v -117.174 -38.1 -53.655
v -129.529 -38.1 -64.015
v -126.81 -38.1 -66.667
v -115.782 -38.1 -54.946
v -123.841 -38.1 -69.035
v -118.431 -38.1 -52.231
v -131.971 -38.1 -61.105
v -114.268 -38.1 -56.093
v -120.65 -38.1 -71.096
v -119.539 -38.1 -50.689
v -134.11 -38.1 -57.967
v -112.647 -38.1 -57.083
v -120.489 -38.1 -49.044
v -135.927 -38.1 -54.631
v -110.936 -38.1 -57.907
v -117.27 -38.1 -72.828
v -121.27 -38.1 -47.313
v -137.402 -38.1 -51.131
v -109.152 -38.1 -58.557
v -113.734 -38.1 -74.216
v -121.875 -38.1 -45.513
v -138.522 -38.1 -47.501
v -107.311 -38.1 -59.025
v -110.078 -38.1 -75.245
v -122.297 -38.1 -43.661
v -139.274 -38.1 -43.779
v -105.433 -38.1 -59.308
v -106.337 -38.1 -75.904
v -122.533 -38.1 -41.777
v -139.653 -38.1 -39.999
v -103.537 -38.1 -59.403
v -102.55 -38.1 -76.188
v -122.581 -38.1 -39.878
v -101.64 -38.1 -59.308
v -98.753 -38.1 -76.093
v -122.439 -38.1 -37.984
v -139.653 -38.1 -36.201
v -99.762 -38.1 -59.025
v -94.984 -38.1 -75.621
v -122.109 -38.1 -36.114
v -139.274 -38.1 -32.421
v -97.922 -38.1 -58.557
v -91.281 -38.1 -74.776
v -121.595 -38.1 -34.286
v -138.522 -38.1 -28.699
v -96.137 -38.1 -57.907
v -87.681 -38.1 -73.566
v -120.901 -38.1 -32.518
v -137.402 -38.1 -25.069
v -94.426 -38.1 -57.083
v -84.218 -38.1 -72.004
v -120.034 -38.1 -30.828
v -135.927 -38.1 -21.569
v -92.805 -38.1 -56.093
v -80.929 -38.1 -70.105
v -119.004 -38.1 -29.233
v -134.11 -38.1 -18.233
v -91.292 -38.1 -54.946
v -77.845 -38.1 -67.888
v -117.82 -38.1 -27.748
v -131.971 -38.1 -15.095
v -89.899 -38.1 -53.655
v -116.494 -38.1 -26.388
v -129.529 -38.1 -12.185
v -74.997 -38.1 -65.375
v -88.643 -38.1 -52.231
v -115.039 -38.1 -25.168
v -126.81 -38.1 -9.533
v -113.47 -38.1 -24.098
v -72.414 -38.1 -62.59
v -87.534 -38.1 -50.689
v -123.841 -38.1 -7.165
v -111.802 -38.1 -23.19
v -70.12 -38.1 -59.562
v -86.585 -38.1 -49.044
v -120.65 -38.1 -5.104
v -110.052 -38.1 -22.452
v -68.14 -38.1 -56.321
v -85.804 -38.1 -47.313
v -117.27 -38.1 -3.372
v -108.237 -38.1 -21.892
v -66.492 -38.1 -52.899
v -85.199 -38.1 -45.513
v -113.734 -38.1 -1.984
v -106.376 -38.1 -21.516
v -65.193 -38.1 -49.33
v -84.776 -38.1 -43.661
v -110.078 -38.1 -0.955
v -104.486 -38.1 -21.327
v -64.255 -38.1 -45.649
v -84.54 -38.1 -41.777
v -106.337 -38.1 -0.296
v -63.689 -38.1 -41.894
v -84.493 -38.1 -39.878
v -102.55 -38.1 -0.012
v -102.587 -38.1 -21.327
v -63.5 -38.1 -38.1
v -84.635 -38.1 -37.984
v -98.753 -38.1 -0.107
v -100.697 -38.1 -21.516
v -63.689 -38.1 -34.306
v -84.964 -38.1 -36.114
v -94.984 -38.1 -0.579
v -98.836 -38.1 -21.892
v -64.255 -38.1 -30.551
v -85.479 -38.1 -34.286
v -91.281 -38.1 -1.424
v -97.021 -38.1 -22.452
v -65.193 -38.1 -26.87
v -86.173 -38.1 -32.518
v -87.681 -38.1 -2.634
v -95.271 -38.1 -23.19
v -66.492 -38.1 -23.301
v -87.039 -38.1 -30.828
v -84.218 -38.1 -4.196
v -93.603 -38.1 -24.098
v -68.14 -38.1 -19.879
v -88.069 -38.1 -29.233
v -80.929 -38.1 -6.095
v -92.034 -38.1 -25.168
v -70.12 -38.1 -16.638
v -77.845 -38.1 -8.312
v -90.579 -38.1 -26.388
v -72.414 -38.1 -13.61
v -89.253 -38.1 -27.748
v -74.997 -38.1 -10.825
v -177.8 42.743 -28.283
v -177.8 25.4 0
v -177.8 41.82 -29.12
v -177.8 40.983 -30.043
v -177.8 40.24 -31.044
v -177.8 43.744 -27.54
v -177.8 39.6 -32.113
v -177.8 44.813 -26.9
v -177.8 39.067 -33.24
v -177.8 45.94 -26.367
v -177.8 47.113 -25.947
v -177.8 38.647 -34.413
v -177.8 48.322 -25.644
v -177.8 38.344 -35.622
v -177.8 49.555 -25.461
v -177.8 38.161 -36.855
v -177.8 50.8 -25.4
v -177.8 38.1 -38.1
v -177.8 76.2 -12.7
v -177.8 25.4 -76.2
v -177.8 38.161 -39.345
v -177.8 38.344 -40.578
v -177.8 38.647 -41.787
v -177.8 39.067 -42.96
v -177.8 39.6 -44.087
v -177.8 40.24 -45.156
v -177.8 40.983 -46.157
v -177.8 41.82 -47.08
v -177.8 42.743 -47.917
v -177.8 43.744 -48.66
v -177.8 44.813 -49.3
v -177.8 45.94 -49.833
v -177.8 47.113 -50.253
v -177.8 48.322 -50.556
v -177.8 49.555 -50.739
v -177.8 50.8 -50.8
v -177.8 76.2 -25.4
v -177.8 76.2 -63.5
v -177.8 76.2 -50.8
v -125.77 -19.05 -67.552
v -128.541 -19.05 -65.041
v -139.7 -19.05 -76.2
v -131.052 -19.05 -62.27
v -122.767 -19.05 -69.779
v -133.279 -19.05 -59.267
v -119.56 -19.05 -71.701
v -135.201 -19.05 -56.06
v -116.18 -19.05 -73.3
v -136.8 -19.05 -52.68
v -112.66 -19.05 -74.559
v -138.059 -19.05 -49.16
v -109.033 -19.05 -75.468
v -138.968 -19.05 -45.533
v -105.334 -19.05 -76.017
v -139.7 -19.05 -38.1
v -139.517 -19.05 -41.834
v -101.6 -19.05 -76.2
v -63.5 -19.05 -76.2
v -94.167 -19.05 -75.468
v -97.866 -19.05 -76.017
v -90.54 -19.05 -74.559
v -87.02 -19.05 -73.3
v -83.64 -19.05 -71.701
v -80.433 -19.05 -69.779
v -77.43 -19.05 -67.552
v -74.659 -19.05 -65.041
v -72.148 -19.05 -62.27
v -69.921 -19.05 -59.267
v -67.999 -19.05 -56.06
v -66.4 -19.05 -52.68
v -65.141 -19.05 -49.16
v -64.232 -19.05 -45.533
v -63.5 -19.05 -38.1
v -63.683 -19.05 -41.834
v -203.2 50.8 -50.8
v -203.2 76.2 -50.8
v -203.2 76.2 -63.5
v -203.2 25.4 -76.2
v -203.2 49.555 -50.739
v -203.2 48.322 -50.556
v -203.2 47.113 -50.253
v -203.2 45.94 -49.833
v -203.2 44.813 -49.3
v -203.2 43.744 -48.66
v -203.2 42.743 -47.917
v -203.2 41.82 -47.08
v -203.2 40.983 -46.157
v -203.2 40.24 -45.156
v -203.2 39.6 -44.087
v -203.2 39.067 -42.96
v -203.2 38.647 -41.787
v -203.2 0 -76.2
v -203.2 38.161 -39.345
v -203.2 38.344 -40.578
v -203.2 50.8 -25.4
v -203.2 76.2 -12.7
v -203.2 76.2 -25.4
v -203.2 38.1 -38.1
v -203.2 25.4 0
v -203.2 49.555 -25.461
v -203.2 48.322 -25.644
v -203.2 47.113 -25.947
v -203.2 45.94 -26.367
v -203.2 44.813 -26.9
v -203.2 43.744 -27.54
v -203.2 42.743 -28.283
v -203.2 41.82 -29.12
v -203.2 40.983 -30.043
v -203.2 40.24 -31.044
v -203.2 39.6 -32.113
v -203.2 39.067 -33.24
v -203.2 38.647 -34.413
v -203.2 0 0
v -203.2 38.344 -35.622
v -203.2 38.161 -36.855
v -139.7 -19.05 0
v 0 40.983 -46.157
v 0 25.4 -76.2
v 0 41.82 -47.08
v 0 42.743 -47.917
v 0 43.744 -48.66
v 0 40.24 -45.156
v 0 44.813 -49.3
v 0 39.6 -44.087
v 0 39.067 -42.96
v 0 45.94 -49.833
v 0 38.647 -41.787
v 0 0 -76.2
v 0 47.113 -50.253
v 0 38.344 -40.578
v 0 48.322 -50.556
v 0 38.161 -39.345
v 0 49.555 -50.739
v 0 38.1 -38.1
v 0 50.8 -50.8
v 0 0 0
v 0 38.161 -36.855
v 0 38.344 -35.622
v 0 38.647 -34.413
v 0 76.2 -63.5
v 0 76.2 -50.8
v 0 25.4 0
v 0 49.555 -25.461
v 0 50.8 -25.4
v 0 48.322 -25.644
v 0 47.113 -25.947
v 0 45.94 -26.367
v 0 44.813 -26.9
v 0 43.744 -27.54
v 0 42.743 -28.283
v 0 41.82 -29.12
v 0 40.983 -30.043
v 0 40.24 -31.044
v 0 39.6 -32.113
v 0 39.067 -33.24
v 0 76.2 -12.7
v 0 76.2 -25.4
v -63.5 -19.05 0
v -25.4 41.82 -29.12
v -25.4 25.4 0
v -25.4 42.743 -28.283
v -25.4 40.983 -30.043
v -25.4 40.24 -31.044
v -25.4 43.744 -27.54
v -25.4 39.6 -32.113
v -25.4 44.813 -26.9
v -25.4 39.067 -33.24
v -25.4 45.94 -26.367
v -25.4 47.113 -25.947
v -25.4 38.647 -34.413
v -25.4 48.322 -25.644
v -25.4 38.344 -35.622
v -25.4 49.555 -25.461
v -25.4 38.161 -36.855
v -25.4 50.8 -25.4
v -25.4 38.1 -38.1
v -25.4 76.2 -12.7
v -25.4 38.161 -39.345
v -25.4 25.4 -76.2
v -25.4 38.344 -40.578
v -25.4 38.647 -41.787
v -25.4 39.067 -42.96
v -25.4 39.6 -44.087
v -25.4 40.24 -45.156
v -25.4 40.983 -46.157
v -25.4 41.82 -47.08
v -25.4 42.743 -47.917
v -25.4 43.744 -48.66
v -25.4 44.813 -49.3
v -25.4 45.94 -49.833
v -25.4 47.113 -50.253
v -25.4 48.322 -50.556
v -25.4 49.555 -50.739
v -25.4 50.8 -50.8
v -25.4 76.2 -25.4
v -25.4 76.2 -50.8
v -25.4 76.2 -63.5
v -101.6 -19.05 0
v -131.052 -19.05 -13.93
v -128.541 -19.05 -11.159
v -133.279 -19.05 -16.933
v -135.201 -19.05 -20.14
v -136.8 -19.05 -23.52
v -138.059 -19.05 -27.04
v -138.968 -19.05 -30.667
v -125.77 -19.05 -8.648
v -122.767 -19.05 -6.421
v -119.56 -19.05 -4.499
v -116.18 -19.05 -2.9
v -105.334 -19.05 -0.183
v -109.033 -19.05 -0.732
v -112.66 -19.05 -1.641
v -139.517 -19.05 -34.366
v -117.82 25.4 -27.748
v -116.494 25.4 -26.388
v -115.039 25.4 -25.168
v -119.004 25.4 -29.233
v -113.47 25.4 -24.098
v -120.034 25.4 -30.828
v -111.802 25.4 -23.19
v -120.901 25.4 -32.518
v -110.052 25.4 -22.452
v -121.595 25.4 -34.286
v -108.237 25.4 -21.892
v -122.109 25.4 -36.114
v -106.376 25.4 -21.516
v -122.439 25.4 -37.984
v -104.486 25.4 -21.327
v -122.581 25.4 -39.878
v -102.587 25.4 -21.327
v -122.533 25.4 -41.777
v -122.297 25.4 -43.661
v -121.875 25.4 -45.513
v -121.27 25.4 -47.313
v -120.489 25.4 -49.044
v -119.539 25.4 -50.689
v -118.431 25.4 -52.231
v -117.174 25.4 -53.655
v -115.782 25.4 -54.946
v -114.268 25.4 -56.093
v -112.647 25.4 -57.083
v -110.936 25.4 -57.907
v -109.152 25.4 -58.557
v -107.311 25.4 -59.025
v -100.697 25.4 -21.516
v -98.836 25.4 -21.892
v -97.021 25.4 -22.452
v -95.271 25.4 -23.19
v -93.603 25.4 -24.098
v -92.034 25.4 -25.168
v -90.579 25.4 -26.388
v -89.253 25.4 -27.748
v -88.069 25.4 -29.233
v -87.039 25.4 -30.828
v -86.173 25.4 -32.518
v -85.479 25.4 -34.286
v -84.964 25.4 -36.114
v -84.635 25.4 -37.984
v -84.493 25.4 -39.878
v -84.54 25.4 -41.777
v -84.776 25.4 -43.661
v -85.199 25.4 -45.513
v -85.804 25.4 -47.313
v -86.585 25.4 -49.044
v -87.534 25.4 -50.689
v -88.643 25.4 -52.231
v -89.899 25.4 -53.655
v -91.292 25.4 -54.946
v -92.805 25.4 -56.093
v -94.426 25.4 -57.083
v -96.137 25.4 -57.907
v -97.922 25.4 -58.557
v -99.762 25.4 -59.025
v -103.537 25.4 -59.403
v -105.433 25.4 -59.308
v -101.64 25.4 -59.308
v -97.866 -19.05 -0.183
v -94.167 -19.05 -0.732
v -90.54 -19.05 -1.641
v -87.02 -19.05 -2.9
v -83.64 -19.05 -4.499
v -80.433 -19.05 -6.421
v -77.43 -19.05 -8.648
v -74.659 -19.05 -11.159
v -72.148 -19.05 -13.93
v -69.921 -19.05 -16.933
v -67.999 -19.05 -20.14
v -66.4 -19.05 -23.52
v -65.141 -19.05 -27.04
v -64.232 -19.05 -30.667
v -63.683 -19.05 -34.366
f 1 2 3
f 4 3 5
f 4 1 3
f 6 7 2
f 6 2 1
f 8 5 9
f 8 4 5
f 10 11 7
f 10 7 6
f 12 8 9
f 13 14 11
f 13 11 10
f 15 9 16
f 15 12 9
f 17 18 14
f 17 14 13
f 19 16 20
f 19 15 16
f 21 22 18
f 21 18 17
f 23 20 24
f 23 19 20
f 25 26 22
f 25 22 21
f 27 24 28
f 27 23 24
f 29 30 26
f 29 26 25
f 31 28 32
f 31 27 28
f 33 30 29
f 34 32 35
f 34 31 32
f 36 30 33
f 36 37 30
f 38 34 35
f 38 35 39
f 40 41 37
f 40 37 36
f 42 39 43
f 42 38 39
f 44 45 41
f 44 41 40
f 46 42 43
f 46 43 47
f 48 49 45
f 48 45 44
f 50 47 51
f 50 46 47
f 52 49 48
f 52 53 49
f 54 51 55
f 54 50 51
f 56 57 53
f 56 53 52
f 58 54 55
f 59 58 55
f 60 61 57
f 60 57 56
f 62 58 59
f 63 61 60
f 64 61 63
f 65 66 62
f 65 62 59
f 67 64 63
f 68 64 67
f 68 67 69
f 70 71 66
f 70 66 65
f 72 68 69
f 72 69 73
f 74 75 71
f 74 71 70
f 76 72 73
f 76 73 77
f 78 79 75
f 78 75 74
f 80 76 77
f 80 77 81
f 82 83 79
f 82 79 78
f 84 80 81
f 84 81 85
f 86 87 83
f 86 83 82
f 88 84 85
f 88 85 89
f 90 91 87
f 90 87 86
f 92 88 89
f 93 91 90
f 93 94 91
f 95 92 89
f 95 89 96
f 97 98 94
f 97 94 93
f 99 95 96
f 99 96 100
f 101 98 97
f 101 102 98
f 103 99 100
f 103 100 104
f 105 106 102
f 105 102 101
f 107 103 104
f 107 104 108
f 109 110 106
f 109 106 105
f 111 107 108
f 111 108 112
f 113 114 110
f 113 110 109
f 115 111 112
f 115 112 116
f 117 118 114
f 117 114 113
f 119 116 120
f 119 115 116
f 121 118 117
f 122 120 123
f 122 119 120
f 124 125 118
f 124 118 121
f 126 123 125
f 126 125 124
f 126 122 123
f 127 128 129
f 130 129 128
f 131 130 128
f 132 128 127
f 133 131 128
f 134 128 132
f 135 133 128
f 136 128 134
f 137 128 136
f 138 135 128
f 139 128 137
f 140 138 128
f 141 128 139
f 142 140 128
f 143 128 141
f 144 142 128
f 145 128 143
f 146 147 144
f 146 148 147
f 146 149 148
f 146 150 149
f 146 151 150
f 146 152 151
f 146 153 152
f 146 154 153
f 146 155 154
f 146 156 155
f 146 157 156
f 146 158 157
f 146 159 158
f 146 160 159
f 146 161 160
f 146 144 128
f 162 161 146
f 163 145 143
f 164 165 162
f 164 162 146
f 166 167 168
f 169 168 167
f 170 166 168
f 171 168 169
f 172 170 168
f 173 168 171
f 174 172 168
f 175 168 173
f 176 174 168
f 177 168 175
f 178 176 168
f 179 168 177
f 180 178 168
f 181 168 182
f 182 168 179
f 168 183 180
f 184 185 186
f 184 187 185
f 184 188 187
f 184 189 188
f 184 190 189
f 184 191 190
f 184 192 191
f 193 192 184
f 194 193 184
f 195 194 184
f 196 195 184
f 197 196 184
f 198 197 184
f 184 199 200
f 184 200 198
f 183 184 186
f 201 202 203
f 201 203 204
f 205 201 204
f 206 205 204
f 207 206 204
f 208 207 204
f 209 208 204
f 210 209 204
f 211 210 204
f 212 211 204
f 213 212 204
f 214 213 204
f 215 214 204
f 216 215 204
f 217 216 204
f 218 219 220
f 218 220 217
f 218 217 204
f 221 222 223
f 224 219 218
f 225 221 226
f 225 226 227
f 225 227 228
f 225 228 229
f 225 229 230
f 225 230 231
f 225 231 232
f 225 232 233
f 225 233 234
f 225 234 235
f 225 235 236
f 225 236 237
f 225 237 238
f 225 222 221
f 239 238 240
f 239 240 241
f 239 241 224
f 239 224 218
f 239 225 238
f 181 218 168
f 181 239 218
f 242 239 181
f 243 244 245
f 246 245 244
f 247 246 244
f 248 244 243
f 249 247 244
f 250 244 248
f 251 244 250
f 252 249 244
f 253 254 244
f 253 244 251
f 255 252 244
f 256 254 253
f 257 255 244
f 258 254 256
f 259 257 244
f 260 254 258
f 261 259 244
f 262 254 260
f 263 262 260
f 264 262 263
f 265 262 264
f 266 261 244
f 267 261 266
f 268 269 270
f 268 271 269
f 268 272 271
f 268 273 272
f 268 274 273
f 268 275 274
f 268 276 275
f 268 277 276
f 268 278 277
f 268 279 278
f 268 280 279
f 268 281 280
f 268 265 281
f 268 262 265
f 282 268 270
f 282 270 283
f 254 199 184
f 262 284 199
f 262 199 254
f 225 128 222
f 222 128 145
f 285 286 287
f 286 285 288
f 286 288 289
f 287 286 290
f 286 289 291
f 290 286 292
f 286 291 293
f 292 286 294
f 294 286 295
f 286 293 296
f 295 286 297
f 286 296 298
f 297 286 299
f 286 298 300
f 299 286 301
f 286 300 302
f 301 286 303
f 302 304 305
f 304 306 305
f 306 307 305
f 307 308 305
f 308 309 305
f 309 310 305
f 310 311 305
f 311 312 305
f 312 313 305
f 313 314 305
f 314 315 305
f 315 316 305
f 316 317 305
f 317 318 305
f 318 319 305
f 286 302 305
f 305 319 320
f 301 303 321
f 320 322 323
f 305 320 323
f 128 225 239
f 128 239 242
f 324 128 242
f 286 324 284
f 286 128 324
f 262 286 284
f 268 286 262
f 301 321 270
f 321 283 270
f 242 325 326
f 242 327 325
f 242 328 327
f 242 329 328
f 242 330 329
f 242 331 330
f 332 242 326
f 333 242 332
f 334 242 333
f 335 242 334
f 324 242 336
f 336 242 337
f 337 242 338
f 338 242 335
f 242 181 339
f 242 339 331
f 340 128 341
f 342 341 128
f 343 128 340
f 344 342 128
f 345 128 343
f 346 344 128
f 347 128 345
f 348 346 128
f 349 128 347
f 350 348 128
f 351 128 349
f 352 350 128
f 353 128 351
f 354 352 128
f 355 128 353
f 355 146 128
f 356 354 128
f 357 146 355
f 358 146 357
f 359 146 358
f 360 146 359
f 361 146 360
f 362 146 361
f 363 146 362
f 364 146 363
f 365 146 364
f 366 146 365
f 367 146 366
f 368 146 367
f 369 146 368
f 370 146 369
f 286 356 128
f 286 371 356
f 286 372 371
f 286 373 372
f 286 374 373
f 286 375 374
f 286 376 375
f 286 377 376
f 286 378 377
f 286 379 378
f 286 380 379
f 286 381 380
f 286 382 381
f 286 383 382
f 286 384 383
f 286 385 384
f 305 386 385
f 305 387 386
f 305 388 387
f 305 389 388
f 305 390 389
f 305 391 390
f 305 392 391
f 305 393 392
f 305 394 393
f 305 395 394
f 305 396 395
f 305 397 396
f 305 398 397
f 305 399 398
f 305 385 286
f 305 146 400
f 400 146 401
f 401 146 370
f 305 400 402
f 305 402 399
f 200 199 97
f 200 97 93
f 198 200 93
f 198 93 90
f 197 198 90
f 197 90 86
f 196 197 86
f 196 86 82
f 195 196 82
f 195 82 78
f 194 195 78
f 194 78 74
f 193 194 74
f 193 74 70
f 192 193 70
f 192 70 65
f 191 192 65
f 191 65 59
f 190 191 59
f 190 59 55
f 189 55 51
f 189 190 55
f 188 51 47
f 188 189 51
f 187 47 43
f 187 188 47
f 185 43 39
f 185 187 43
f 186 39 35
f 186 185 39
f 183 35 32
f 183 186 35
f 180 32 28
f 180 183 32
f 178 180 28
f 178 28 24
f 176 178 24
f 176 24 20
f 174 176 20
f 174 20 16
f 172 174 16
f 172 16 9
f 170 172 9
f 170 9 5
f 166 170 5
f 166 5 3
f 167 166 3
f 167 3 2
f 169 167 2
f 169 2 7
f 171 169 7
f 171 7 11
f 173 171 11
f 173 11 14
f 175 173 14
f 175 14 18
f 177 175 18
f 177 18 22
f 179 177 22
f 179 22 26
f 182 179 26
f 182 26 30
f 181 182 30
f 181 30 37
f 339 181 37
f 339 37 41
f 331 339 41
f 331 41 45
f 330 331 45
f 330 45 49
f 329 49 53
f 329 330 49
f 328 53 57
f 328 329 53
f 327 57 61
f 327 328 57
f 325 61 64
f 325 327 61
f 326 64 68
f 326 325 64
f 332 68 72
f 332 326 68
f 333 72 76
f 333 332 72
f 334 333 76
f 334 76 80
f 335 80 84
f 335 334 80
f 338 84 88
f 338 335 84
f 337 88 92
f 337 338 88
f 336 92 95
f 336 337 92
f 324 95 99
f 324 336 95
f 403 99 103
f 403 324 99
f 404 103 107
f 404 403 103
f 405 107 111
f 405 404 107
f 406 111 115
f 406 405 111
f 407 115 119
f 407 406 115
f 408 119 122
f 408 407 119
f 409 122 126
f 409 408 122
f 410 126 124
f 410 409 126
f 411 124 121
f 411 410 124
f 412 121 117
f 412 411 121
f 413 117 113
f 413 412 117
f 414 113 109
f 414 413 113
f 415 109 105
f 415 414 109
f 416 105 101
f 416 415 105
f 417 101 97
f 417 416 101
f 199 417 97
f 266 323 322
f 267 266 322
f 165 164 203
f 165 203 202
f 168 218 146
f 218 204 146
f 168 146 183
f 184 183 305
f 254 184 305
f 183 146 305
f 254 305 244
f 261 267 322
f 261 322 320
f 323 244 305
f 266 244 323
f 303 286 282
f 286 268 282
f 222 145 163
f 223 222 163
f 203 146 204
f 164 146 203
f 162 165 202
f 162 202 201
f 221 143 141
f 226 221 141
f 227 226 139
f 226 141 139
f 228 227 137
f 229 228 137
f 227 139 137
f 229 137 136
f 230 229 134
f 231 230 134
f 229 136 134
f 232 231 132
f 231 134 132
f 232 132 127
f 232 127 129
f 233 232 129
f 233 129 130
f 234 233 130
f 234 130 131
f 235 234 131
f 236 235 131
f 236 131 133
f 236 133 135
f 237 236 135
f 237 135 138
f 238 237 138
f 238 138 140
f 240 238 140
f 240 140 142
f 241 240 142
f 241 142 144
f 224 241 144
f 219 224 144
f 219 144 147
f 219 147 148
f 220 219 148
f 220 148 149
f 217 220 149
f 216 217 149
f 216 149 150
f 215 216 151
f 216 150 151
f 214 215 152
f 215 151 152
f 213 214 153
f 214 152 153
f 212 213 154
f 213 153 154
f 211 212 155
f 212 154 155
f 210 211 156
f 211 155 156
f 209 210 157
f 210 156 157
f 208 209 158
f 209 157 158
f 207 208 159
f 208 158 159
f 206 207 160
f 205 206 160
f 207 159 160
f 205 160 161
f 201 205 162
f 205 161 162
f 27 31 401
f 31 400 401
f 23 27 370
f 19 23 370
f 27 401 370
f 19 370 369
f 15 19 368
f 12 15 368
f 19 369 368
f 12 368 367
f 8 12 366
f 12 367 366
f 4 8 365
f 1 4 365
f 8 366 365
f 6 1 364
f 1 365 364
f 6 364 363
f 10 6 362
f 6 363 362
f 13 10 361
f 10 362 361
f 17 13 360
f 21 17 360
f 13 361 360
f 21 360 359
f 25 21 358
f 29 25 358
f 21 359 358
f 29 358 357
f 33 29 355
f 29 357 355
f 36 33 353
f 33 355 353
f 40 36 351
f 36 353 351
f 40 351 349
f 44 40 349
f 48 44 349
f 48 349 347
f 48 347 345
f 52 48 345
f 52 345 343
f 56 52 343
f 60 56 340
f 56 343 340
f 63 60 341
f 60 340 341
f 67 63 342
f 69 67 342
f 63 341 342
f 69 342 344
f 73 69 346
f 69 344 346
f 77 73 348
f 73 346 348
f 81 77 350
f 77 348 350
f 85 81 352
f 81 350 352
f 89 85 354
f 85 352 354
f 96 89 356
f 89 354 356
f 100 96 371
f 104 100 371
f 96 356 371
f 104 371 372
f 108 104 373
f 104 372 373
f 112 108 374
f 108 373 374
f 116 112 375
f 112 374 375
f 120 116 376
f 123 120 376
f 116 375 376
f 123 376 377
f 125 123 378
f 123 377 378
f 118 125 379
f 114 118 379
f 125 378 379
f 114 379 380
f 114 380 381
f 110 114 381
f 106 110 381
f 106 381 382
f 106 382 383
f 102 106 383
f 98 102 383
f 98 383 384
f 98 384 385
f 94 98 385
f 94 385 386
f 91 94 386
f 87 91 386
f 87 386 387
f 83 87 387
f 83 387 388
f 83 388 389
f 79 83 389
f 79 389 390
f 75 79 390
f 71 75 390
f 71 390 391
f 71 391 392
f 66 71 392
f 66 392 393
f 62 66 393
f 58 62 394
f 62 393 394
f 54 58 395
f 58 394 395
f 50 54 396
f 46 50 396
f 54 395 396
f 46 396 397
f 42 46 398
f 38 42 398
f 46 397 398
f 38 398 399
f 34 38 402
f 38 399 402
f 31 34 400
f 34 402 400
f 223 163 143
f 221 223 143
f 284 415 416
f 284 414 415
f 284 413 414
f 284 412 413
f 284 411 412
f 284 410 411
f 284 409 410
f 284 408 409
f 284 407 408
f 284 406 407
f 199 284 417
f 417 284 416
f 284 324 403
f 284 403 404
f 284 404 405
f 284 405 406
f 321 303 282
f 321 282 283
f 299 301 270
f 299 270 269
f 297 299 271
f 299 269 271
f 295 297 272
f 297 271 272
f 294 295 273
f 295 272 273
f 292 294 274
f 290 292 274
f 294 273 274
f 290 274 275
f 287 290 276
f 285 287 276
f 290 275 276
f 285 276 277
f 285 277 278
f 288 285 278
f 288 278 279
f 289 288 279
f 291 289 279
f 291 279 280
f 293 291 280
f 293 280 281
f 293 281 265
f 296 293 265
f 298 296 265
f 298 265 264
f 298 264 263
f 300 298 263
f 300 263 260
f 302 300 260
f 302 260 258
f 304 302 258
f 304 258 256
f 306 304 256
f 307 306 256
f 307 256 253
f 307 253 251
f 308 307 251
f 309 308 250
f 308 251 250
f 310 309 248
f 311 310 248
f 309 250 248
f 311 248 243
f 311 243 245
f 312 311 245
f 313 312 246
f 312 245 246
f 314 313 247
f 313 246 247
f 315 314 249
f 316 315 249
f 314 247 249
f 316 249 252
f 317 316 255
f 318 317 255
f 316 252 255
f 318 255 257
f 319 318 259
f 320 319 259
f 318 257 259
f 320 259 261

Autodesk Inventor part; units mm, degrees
ref_plane "YZ Plane" through (0, 0, 0) normal (1, 0, 0) x (0, 1, 0)
ref_plane "XZ Plane" through (0, 0, 0) normal (0, 1, 0) x (-1, 0, 0)
ref_plane "XY Plane" through (0, 0, 0) normal (0, 0, 1) x (1, 0, 0)
sketch "Sketch1" plane through (0, 0, 0) normal (0, 0, 1) x (1, 0, 0)
  line L0 (0, 0) -> (0, 25.4)
  line L1 (0, 25.4) -> (-203.2, 25.4)
  line L2 (-203.2, 25.4) -> (-203.2, 0)
  line L3 (-203.2, 0) -> (-139.7, -19.05)
  line L4 (-139.7, -19.05) -> (-63.5, -19.05)
  line L5 (-63.5, -19.05) -> (0, 0)
  dimension "d0" = 203.2
  dimension "d1" = 25.4
  dimension "d2" = 63.5
  dimension "d3" = 44.45
extrude "Extrusion1" add sketch "Sketch1" against normal blind 76.2
sketch "Sketch2" plane through (0, 0, 0) normal (1, 0, 0) x (0, 0, -1)
  line L0 (12.7, 76.2) -> (25.4, 76.2)
  line L1 (25.4, 76.2) -> (25.4, 50.8)
  line L2 (76.2, 25.4) -> (63.5, 76.2)
  line L3 (63.5, 76.2) -> (50.8, 76.2)
  line L4 (0, 25.4) -> (76.2, 25.4) projected
  line L5 (50.8, 76.2) -> (50.8, 50.8)
  arc A0 (25.4, 50.8) -> (50.8, 50.8) centre (38.1, 50.8) ccw
  line L6 (0, 25.4) -> (12.7, 76.2)
  line L7 (0, 25.4) -> (76.2, 25.4)
  point P0 (0, 0)
  dimension "d6" = 12.7
  dimension "d7" = 25.4
  dimension "d8" = 76.2
  dimension "d9" = 76.2
  dimension "d10" = 50.8
extrude "Extrusion2" add sketch "Sketch2" against normal blind 203.2
sketch "Sketch3" plane through (0, 76.2, -12.7) normal (0, 1, 0) x (1, 0, 0)
  line L0 (0, -12.7) -> (-203.2, -12.7) projected
  line L1 (-177.8, -12.7) -> (-177.8, 63.5)
  line L2 (-139.7, 63.5) -> (-203.2, 63.5) projected
  line L3 (-177.8, -12.7) -> (-25.4, -12.7)
  line L4 (-63.5, -12.7) -> (0, -12.7) projected
  line L5 (-25.4, -12.7) -> (-25.4, 63.5)
  line L6 (0, 63.5) -> (-63.5, 63.5) projected
  line L7 (-25.4, 63.5) -> (-177.8, 63.5)
  line L8 (-203.2, 12.7) -> (-203.2, 38.1) projected
  line L9 (0, 38.1) -> (0, 12.7) projected
  dimension "d13" = 25.4
  dimension "d14" = 25.4
extrude "Extrusion3" cut sketch "Sketch3" against normal blind 50.8
sketch "Sketch4" plane through (-139.7, -19.05, 0) normal (0, -1, 0) x (1, 0, 0)
  circle A0 centre (38.1, -38.1) radius 38.1
  line L0 (0, 0) -> (76.2, 0) projected
  line L1 (76.2, 0) -> (76.2, -76.2) projected
  point P0 (139.7, 0)
  dimension "d17" = 76.2
extrude "Extrusion4" add sketch "Sketch4" along normal blind 19.05 contours A0
hole "Hole1" at (-103.5367, -38.1, -40.3531) direction (0, 1, 0) diameter 38.1 end through all
properties part number "HW 7 Part 1" material "Iron, Cast"
